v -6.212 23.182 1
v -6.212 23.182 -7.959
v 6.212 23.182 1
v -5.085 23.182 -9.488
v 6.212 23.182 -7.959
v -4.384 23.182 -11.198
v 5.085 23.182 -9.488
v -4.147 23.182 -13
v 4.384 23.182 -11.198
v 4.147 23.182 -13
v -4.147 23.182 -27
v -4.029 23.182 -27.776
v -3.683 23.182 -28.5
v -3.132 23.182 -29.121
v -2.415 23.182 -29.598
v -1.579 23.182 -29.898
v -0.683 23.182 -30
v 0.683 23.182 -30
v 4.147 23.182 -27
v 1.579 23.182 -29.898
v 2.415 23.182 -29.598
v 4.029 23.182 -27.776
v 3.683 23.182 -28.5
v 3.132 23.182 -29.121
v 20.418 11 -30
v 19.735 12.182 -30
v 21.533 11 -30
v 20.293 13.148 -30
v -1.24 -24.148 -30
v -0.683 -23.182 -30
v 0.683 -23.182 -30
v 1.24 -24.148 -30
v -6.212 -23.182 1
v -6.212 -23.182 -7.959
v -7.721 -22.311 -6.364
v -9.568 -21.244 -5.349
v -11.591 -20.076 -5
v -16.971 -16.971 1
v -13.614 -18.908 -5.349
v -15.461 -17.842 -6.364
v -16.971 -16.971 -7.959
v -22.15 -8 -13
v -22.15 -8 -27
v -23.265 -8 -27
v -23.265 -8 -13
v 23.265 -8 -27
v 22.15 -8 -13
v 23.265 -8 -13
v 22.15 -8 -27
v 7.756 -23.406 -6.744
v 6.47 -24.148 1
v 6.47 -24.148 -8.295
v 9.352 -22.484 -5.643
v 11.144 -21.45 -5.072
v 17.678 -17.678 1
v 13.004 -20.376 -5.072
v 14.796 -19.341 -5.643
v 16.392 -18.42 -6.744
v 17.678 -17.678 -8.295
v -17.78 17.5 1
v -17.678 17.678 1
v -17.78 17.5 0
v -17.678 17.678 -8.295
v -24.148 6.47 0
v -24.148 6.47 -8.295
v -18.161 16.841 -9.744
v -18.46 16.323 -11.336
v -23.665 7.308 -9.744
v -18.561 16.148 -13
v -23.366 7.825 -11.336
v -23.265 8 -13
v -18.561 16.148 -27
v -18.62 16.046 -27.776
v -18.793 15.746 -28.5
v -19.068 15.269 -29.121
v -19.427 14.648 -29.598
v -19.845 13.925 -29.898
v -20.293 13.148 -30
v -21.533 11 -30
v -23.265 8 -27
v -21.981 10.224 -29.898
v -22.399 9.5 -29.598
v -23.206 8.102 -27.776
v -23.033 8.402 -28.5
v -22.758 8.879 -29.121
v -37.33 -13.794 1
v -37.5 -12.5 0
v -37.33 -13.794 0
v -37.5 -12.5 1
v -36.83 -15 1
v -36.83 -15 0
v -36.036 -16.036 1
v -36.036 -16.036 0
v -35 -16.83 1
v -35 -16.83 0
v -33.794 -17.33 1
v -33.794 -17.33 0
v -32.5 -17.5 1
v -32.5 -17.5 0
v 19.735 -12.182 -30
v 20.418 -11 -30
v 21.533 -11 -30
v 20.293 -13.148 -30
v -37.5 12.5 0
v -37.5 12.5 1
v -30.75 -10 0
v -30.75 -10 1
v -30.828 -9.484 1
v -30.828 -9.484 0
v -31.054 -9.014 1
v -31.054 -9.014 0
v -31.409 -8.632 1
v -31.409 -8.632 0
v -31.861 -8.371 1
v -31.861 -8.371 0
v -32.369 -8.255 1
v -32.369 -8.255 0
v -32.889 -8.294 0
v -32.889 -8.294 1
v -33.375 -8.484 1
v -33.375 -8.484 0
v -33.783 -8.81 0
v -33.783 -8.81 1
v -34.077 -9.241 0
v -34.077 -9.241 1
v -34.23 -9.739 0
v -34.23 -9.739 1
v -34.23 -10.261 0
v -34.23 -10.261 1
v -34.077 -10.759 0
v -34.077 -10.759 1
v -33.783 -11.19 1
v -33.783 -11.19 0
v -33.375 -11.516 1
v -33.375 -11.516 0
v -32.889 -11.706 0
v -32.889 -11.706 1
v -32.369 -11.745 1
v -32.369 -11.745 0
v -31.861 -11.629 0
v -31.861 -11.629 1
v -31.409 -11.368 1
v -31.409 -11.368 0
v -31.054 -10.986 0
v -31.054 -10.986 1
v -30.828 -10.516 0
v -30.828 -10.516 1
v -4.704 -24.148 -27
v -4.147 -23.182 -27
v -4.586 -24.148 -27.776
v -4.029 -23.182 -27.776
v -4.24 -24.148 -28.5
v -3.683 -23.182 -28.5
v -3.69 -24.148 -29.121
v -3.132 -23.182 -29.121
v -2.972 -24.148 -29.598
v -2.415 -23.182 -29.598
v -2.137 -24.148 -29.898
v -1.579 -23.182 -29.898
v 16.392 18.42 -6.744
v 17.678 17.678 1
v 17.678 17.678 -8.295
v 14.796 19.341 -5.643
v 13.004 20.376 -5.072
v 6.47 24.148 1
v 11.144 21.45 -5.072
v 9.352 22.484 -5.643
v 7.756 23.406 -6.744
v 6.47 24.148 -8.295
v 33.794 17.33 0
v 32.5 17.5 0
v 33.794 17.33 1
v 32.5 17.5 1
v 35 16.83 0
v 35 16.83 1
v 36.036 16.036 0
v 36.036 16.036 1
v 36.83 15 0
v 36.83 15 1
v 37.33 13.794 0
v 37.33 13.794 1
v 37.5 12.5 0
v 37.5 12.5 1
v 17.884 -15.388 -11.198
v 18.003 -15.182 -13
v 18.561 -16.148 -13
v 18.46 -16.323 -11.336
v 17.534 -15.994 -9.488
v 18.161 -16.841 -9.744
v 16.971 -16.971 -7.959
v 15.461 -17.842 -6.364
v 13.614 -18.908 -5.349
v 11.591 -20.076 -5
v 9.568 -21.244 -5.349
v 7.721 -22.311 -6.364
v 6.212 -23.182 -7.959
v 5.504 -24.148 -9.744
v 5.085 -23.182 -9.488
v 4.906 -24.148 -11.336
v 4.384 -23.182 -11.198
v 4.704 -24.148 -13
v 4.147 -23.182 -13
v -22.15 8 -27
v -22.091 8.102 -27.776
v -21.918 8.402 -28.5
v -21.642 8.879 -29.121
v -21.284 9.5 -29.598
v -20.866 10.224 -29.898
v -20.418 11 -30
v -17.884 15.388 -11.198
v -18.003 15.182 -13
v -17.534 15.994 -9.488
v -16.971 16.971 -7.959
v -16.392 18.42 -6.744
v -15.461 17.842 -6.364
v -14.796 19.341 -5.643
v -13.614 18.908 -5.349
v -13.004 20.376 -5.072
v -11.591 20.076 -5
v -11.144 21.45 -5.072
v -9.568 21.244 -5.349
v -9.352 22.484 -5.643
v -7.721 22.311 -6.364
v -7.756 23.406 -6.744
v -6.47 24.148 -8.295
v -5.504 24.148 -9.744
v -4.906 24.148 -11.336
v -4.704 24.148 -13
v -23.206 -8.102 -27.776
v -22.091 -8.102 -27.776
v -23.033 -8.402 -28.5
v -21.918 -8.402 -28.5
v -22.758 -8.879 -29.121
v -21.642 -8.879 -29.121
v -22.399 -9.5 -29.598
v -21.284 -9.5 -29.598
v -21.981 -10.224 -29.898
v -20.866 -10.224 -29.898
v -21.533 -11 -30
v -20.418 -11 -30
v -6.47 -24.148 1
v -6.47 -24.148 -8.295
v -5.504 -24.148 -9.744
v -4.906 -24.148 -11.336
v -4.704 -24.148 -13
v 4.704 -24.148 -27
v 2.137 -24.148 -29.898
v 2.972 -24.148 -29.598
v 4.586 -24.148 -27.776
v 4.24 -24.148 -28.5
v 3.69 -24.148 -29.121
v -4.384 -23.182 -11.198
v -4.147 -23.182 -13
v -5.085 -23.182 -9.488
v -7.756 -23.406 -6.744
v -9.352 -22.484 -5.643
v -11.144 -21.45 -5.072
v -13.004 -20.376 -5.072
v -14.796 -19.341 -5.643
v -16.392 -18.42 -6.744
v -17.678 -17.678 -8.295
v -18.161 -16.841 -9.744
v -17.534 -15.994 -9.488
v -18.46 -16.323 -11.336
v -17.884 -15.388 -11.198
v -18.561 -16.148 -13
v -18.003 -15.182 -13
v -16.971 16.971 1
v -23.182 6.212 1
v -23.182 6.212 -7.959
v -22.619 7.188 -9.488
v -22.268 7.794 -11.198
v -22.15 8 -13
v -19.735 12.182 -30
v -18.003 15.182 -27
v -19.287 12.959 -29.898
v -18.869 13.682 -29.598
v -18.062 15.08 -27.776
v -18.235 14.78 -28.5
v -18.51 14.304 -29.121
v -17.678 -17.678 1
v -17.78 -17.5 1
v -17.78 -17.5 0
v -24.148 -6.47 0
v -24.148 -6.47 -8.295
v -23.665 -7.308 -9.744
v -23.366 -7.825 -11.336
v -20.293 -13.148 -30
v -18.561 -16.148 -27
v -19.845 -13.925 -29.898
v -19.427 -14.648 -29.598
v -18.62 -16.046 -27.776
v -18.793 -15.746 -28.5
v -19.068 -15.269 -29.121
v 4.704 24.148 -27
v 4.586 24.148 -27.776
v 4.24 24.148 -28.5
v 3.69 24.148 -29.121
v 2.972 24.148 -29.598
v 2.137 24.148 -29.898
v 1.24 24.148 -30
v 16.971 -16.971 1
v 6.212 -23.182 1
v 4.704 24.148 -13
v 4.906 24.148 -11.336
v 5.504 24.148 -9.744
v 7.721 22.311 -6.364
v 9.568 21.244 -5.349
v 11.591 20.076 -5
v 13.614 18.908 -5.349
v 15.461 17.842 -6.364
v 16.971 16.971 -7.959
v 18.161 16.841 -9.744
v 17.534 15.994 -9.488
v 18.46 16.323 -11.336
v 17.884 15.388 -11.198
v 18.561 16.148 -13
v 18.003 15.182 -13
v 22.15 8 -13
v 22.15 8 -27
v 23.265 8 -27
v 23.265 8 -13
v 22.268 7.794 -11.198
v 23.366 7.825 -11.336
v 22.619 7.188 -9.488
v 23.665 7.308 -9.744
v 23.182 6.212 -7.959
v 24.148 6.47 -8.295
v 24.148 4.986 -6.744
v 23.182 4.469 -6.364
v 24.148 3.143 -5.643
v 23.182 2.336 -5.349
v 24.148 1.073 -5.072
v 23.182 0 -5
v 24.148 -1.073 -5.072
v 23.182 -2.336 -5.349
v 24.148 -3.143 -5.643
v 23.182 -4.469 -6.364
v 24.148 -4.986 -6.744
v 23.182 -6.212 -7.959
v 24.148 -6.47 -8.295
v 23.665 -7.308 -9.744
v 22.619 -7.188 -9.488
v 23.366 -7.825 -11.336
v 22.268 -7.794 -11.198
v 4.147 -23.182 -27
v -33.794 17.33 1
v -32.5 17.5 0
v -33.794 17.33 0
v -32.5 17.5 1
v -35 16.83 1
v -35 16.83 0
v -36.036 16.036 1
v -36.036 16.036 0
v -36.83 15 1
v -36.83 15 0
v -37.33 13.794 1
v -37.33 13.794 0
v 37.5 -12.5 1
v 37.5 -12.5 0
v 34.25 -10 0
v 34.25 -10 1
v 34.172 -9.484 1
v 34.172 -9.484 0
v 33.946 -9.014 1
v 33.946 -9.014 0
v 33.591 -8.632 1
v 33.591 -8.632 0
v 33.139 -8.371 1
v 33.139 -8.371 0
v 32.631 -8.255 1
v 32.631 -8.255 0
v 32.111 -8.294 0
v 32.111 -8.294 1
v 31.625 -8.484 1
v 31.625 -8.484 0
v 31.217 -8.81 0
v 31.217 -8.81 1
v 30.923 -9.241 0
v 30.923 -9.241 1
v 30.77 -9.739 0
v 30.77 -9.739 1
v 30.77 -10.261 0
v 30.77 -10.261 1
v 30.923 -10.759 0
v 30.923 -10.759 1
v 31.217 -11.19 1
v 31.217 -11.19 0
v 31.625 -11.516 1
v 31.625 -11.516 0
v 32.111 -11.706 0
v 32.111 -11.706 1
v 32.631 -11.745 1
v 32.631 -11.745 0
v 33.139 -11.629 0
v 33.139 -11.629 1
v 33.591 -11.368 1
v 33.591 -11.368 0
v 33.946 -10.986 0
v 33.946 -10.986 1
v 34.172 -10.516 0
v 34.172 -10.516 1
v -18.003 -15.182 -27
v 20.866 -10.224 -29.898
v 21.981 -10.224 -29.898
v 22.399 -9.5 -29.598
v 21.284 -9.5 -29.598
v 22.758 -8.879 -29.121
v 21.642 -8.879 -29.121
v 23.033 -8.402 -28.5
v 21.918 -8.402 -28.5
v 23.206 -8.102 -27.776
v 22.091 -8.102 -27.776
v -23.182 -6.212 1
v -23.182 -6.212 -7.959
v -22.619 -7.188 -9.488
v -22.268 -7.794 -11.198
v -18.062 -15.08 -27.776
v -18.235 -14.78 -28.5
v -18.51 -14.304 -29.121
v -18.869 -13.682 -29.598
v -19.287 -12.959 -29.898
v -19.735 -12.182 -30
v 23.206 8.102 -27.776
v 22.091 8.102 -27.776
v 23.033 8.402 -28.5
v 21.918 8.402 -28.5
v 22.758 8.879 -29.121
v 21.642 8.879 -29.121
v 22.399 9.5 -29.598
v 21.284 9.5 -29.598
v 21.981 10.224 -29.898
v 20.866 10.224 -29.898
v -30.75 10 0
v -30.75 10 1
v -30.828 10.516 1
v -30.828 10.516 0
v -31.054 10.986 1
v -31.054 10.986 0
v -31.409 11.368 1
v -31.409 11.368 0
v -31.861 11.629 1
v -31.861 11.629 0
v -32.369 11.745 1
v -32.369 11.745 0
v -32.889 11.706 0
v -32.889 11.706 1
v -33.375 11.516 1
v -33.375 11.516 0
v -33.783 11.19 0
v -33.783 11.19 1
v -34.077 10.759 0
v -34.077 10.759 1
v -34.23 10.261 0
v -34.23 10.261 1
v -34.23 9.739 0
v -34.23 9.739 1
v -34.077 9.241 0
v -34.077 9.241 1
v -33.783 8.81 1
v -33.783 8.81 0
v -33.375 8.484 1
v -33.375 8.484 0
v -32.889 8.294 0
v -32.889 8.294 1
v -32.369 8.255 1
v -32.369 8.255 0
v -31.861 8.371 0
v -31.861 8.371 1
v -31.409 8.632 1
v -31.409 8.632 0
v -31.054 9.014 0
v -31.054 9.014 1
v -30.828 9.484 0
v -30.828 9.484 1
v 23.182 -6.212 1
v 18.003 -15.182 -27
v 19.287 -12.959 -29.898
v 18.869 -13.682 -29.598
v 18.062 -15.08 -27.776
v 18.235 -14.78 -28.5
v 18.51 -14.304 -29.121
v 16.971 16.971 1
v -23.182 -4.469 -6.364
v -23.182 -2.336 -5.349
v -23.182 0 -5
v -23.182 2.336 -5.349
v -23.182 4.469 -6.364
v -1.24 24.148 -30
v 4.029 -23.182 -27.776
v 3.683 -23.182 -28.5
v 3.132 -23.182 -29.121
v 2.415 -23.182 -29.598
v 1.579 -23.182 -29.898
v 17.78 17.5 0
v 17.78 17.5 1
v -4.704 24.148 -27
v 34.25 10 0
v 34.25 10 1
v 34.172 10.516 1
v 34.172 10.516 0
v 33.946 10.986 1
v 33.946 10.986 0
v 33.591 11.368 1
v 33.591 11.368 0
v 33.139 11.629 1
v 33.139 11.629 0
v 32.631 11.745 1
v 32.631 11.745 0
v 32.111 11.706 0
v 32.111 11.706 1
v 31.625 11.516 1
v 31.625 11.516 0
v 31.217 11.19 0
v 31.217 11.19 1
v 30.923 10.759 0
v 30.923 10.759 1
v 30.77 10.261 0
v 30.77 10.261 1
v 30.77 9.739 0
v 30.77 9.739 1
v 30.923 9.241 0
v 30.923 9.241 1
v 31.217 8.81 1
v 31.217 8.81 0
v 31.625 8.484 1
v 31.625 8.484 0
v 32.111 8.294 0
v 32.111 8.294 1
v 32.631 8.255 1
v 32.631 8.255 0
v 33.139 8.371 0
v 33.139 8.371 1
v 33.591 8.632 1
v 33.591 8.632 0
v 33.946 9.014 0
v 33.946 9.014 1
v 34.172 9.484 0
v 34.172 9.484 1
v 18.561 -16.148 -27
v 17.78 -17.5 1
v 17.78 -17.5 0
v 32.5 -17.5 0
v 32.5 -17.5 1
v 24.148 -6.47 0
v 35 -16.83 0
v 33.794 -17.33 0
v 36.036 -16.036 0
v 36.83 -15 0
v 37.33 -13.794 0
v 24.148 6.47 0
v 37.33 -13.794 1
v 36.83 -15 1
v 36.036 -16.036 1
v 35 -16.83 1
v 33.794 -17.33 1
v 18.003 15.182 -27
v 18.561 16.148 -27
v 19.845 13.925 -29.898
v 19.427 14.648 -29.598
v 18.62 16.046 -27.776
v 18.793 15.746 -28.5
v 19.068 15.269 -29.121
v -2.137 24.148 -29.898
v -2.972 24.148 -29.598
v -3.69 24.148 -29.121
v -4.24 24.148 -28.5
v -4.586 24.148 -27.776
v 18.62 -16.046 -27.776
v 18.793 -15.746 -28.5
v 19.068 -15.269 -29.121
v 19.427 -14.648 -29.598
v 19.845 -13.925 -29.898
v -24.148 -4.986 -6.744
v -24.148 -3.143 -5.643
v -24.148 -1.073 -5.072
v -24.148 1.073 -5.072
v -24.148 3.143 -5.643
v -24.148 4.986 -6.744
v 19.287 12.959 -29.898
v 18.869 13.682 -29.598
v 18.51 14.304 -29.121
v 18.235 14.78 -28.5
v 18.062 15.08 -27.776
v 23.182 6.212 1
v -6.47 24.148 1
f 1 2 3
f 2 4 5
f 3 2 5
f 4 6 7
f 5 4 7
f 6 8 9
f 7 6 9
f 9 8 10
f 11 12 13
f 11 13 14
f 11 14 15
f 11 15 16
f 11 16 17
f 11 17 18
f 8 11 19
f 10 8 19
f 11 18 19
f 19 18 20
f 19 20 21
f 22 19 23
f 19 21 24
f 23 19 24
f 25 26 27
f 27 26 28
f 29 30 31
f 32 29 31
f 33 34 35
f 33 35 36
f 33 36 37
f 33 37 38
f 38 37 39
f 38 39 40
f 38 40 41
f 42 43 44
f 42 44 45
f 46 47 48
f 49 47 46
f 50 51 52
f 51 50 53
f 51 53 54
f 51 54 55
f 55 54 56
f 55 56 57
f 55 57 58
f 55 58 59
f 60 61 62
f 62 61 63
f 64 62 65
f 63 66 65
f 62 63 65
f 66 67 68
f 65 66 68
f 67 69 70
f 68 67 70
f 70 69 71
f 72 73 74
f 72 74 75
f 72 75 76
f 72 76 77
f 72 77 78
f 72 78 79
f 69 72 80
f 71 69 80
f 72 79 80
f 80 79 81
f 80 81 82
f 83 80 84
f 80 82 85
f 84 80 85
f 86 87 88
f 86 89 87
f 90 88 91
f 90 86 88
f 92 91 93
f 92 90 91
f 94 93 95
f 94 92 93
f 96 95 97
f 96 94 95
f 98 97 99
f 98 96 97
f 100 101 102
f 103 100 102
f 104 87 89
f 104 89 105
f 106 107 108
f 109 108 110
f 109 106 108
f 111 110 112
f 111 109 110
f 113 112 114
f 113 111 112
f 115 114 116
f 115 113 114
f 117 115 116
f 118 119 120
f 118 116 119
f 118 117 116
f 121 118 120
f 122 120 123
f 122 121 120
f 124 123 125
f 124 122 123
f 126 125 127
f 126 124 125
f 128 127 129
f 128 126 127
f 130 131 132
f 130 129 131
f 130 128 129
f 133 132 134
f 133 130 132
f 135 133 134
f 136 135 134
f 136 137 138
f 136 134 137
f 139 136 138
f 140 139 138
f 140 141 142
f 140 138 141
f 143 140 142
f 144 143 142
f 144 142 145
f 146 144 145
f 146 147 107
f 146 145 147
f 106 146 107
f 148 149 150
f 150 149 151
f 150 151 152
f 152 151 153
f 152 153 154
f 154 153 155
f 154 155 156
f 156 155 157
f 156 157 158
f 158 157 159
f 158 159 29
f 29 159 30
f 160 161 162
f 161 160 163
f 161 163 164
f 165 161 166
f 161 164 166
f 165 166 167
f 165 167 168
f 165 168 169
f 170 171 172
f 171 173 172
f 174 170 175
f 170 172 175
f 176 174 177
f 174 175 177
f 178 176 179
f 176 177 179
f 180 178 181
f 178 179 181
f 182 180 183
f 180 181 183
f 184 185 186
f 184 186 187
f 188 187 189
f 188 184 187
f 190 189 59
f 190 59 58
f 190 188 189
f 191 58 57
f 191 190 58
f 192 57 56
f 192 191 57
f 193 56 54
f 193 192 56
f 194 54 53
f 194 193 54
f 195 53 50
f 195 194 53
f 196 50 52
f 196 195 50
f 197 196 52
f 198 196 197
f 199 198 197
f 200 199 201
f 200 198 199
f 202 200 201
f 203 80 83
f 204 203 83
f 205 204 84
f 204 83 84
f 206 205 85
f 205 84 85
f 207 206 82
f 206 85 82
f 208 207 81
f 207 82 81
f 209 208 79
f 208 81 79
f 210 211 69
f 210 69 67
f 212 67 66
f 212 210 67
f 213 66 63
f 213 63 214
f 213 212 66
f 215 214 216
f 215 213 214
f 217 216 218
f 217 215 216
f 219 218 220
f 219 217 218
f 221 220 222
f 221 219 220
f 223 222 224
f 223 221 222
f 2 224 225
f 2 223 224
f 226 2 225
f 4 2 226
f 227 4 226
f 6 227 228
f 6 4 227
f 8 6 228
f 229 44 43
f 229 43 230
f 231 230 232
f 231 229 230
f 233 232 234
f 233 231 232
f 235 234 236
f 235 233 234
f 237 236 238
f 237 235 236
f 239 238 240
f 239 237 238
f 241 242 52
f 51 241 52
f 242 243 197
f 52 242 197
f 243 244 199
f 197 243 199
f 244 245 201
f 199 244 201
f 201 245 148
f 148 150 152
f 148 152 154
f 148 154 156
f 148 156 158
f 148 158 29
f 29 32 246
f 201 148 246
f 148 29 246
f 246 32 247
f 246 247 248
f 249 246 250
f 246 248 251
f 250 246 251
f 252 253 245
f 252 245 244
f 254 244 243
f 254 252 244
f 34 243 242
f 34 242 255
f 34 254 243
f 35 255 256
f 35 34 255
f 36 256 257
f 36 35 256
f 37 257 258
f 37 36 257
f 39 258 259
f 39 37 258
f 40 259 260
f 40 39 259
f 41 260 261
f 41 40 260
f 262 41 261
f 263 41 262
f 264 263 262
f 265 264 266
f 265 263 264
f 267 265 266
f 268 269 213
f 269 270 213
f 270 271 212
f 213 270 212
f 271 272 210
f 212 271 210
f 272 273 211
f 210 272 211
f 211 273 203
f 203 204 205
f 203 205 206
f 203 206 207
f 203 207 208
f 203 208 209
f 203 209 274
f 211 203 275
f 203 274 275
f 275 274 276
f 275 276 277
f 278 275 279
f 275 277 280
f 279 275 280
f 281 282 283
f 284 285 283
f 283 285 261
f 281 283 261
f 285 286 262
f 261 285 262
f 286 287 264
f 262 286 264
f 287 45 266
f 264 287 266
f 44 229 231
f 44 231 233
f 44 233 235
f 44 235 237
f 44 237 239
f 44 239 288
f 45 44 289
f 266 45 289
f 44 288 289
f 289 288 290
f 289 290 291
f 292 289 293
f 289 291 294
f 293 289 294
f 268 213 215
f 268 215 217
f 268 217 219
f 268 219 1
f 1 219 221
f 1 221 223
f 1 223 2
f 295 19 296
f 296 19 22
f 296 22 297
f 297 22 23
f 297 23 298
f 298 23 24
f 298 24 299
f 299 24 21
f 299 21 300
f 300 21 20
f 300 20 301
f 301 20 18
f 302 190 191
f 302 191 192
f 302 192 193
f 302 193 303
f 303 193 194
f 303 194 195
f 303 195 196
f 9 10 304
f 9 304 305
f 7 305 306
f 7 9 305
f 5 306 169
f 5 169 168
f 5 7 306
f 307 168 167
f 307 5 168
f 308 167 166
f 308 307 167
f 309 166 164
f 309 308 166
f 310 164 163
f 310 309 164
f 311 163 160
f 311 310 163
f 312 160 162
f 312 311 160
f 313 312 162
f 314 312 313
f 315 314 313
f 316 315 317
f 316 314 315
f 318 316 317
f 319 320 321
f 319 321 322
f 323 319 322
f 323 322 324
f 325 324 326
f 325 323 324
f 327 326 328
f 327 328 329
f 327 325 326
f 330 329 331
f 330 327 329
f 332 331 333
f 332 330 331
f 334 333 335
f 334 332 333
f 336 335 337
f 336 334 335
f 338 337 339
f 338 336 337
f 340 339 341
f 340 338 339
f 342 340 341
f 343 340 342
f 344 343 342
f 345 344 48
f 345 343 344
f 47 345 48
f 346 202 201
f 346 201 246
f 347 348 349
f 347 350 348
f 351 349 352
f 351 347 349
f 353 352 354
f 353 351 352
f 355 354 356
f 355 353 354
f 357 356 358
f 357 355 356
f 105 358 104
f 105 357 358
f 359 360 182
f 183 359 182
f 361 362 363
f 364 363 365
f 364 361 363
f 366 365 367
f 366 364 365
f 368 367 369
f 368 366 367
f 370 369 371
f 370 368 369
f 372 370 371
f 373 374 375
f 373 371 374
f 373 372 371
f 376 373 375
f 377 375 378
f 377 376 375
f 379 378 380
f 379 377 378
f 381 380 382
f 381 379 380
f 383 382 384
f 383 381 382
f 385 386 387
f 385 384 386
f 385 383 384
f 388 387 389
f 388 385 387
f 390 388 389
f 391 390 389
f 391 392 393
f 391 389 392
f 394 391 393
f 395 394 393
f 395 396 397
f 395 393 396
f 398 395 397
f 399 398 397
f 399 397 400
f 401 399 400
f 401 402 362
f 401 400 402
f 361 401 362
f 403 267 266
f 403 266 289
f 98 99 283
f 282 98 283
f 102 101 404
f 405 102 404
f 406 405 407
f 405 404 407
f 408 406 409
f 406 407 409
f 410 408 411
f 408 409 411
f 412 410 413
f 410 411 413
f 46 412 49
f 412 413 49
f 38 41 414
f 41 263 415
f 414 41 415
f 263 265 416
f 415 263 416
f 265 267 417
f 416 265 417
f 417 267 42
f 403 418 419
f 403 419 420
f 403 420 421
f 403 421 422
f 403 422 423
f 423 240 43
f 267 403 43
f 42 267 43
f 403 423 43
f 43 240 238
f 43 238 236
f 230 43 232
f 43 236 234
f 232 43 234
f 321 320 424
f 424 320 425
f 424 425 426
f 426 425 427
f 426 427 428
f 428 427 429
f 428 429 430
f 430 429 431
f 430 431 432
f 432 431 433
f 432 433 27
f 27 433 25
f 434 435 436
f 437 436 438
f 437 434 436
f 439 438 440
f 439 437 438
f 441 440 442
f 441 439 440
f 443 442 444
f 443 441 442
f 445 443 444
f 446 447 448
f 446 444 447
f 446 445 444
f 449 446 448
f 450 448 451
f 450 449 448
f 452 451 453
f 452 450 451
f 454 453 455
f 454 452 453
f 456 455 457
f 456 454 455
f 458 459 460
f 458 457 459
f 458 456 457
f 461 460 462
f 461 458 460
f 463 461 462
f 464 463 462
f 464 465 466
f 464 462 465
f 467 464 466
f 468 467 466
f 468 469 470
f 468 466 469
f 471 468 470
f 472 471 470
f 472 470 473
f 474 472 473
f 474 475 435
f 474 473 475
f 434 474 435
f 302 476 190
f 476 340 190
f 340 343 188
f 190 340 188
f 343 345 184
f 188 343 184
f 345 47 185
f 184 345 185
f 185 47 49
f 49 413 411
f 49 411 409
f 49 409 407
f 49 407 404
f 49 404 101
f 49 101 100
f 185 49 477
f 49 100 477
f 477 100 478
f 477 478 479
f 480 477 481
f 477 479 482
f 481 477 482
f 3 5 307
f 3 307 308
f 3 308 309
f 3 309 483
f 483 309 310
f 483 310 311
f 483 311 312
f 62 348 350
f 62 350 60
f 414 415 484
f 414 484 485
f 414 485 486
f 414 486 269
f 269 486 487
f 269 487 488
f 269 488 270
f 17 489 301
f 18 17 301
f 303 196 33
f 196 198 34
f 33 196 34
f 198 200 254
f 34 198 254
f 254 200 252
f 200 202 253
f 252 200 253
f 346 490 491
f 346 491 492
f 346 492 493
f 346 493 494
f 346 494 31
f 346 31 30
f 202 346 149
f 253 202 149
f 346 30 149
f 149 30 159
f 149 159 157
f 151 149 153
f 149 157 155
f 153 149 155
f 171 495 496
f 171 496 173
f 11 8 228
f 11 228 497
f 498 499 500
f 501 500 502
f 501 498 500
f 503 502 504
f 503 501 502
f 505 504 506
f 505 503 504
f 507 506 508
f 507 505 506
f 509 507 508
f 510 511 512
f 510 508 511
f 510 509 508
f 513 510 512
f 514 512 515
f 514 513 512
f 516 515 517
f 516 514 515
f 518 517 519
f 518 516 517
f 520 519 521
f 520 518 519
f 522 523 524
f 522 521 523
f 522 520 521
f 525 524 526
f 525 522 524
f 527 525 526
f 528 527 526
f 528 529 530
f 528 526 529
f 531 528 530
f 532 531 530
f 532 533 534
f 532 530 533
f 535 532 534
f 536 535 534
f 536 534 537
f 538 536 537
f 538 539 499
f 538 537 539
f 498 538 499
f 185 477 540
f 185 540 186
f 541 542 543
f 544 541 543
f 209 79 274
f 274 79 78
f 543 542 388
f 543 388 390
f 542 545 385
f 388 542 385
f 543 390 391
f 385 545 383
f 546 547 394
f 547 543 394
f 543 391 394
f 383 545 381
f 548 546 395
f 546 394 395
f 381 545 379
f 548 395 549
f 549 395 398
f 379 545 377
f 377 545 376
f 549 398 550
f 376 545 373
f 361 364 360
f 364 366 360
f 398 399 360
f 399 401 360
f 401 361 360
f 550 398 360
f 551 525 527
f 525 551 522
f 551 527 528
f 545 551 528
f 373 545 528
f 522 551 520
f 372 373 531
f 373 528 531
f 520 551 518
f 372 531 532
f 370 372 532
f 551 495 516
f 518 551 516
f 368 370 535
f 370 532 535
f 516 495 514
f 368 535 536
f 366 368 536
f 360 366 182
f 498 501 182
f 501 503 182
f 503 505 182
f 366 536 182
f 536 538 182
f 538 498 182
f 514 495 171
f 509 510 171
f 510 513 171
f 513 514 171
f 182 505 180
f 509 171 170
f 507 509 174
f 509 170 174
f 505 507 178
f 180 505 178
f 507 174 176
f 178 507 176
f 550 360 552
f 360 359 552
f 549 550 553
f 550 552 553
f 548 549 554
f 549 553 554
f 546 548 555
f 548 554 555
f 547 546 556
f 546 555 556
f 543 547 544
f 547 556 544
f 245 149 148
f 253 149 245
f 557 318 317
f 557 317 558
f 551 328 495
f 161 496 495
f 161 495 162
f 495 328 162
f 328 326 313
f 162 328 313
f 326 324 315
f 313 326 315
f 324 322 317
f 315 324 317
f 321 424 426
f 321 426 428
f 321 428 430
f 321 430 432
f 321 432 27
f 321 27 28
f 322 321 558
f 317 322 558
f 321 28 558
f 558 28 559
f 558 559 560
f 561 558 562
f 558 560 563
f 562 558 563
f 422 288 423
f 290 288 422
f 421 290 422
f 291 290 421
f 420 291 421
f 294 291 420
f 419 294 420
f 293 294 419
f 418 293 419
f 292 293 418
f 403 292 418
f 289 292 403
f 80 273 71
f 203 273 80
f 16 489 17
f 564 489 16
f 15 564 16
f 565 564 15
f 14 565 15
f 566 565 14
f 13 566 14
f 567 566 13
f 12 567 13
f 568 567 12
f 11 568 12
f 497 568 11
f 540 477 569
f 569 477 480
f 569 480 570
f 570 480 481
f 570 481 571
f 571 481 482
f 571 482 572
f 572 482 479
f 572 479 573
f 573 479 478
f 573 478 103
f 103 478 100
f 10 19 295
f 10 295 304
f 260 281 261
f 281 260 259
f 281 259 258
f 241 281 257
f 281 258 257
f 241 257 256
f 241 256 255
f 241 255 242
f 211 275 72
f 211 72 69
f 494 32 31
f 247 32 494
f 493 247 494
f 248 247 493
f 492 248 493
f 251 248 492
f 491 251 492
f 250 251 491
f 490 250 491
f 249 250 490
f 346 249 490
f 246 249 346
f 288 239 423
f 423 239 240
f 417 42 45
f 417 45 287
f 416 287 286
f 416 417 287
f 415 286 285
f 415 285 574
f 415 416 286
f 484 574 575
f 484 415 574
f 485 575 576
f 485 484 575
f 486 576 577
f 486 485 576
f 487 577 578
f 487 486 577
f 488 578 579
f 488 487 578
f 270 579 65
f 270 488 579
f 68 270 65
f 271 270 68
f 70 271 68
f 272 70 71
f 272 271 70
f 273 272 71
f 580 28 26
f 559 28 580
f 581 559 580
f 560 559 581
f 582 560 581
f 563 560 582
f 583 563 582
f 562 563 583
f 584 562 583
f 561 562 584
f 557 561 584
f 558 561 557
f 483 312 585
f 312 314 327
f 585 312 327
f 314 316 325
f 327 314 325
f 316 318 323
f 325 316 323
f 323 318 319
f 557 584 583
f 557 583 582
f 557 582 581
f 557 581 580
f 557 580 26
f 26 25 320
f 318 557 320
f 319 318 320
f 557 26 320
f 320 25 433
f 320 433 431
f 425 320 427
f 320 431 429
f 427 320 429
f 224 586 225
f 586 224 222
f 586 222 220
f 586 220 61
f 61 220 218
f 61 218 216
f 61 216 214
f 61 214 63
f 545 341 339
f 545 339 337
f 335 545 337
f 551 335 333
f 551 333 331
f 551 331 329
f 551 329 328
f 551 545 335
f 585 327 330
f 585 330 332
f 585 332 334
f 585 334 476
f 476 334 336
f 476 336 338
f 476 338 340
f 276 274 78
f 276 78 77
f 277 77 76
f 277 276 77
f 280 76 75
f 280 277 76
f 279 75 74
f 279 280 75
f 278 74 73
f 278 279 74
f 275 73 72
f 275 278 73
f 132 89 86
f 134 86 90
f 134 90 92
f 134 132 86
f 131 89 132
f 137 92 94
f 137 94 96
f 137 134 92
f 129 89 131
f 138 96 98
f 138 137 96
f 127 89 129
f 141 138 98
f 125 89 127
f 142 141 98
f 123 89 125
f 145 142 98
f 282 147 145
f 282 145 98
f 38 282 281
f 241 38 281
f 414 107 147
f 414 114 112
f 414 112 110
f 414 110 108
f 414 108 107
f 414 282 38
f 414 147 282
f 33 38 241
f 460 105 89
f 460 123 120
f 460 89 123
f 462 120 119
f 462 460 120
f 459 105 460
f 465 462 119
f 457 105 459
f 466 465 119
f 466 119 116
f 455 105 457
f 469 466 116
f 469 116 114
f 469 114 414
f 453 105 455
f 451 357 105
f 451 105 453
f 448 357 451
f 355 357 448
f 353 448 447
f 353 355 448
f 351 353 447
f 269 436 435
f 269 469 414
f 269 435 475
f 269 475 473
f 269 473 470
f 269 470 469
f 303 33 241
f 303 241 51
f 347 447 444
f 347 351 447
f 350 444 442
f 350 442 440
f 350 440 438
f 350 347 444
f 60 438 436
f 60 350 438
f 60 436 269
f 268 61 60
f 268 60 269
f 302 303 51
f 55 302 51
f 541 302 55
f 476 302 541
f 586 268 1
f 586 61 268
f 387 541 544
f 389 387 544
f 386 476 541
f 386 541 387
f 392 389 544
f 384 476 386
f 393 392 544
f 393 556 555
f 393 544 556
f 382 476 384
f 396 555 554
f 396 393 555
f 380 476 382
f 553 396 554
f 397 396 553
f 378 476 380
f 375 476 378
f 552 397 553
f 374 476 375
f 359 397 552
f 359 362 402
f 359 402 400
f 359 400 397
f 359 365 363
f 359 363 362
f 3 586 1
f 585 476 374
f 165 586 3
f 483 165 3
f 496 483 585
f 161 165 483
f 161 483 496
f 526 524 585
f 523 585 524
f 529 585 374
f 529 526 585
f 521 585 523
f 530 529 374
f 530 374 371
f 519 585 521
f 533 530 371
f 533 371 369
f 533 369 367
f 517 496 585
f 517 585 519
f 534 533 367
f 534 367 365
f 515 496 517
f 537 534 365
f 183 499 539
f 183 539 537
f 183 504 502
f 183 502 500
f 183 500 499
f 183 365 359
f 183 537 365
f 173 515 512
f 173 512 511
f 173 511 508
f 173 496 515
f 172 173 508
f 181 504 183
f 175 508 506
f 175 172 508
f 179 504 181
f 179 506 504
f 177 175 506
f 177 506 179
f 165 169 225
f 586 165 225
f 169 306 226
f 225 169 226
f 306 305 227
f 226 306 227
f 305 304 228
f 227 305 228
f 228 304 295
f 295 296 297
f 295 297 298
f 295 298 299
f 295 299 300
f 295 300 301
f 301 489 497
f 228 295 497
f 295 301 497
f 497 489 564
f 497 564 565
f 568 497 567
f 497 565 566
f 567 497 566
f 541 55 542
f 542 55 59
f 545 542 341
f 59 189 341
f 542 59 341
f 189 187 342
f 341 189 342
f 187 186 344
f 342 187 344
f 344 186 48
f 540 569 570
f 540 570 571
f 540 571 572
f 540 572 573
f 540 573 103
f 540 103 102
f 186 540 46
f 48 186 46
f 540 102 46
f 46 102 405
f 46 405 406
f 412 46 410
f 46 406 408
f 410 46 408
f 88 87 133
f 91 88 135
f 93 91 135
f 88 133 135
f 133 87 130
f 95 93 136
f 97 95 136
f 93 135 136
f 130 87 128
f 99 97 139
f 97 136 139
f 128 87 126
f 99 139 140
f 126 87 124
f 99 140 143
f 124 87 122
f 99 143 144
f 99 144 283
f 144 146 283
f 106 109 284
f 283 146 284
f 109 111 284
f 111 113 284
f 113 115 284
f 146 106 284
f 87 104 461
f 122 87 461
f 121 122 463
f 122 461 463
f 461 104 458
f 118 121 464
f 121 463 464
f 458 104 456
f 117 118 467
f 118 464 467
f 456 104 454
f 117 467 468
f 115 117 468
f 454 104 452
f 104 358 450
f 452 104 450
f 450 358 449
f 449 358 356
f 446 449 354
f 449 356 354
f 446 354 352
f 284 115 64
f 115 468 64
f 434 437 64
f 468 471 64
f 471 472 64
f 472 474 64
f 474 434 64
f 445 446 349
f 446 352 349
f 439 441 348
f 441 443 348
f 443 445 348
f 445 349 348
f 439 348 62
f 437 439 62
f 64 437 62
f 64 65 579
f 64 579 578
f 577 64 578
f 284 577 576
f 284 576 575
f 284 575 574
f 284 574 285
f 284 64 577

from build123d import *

# Parameters (mm, degrees)
F0_W             = 75
F0_H             = 35
F1_DEPTH         = 1
F3_DEPTH         = 30
F5_DEPTH         = 35
F6_R             = 5
F7_R             = 1.75
F8_DEPTH         = 25
F9_DEPTH         = 1
F10_DEPTH        = 65.4
F13_DEPTH        = 35.6
F13_COPIES_COUNT = 6
F14_T1_DEPTH     = 16.1153550717
F14_T3_DEPTH     = 16.1153550717
F14_T5_DEPTH     = 16.1153550717
F14_T7_DEPTH     = 16.1153550717
F14_T9_DEPTH     = 16.1153550717
F14_T11_DEPTH    = 16.1153550717
F14_T13_DEPTH    = 16.1153550717
F14_T15_DEPTH    = 16.1153550717
F14_T17_DEPTH    = 16.1153550717
F14_T19_DEPTH    = 16.1153550717


# Not quite as in the source:
# - a fillet or chamfer that OpenCascade refuses, or shapes differently, is made with other operations: its cross-section is extruded or revolved along the edge and cut away or added
# - a pattern or mirror of a feature is missing from the dataset's text; its kind, count and spacing are read off the source's solid


with BuildPart() as f1:
    # F0 (on Top) → F1 (new body)
    with BuildSketch(Plane.XY):
        Rectangle(F0_W, F0_H)
    extrude(amount=F1_DEPTH)

    # F2 (on Top) → F3 (join)
    with BuildSketch(Plane.XY):
        Polygon((24.1481456572, 6.4704761276), (17.6776695297, 17.6776695297), (6.4704761276, 24.1481456572), (-6.4704761276, 24.1481456572), (-17.6776695297, 17.6776695297), (-24.1481456572, 6.4704761276), (-24.1481456572, -6.4704761276), (-17.6776695297, -17.6776695297), (-6.4704761276, -24.1481456572), (6.4704761276, -24.1481456572), (17.6776695297, -17.6776695297), (24.1481456572, -6.4704761276), align=None)
    extrude(amount=-F3_DEPTH)

    # F4 (on face) → F5 (cut)
    with BuildSketch(Plane(origin=(0, 0, -30), x_dir=(1, 0, 0), z_dir=(0, 0, -1))):
        Polygon((6.2116570825, -23.1822198309), (16.9705627485, -16.9705627485), (23.1822198309, -6.2116570825), (23.1822198309, 6.2116570825), (16.9705627485, 16.9705627485), (6.2116570825, 23.1822198309), (-6.2116570825, 23.1822198309), (-16.9705627485, 16.9705627485), (-23.1822198309, 6.2116570825), (-23.1822198309, -6.2116570825), (-16.9705627485, -16.9705627485), (-6.2116570825, -23.1822198309), align=None)
    extrude(amount=-F5_DEPTH, mode=Mode.SUBTRACT)

    # F6
    f6_edges = [f1.edges().sort_by_distance(p)[0] for p in [
        (37.5, -17.5, 0.5),
        (37.5, 17.5, 0.5),
        (-37.5, -17.5, 0.5),
        (-37.5, 17.5, 0.5),
    ]]
    fillet(f6_edges, radius=F6_R)

    # F7 (on Top) → F8 (cut)
    with BuildSketch(Plane.XY):
        with Locations((-32.5, 10)):
            Circle(F7_R)
        with Locations((-32.5, -10)):
            Circle(F7_R)
        with Locations((32.5, -10)):
            Circle(F7_R)
        with Locations((32.5, 10)):
            Circle(F7_R)
    extrude(amount=F8_DEPTH, mode=Mode.SUBTRACT)

    # F2 (on Top) → F9 (join)
    with BuildSketch(Plane.XY):
        Polygon((24.1481456572, 6.4704761276), (17.6776695297, 17.6776695297), (6.4704761276, 24.1481456572), (-6.4704761276, 24.1481456572), (-17.6776695297, 17.6776695297), (-24.1481456572, 6.4704761276), (-24.1481456572, -6.4704761276), (-17.6776695297, -17.6776695297), (-6.4704761276, -24.1481456572), (6.4704761276, -24.1481456572), (17.6776695297, -17.6776695297), (24.1481456572, -6.4704761276), align=None)
    extrude(amount=F9_DEPTH)

    # F4 (on face) → F10 (cut)
    with BuildSketch(Plane(origin=(0, 0, -30), x_dir=(1, 0, 0), z_dir=(0, 0, -1))):
        Polygon((6.2116570825, -23.1822198309), (16.9705627485, -16.9705627485), (23.1822198309, -6.2116570825), (23.1822198309, 6.2116570825), (16.9705627485, 16.9705627485), (6.2116570825, 23.1822198309), (-6.2116570825, 23.1822198309), (-16.9705627485, 16.9705627485), (-23.1822198309, 6.2116570825), (-23.1822198309, -6.2116570825), (-16.9705627485, -16.9705627485), (-6.2116570825, -23.1822198309), align=None)
    extrude(amount=-F10_DEPTH, mode=Mode.SUBTRACT)

    # F12 (on Right) → F13 (cut)
    with BuildSketch(Plane.YZ):
        with BuildLine():
            ThreePointArc((-8, -13), (0, -21), (8, -13))
            ThreePointArc((8, -13), (0, -5), (-8, -13))
        make_face()
        with BuildLine():
            Line((8, -37.0977148414), (8, -13))
            ThreePointArc((8, -13), (0, -21), (-8, -13))
            Line((-8, -13), (-8, -36.2910553813))
            Line((-8, -36.2910553813), (8, -37.0977148414))
        make_face()
    f13 = extrude(amount=F13_DEPTH, mode=Mode.SUBTRACT)

    # F13_copies: F13 ×6 about axis
    f13_copies_axis = Axis((0, 0, 0), (0, 0, 1))
    for i in range(1, F13_COPIES_COUNT):
        add(f13.rotate(f13_copies_axis, i * 360 / F13_COPIES_COUNT), mode=Mode.SUBTRACT)

    # F14: fillet of radius 3 on 12 edges, made by hand

    # F14_s2 → F14_t1 (cut)
    with BuildSketch(Plane.YZ.offset(14.6497195661)):
        with BuildLine():
            ThreePointArc((-11, -30), (-8.8786796564, -29.1213203436), (-8, -27))
            Line((-8, -27), (-8, -30))
            Line((-8, -30), (-11, -30))
        make_face()
        with BuildLine():
            ThreePointArc((8, -27), (8.8786796564, -29.1213203436), (11, -30))
            Line((11, -30), (8, -30))
            Line((8, -30), (8, -27))
        make_face()
    extrude(amount=F14_T1_DEPTH, mode=Mode.SUBTRACT)

    # F14_s4 → F14_t3 (cut)
    with BuildSketch(Plane.YZ.offset(-30.7650746377)):
        with BuildLine():
            ThreePointArc((-8, -27), (-8.8786796564, -29.1213203436), (-11, -30))
            Line((-11, -30), (-8, -30))
            Line((-8, -30), (-8, -27))
        make_face()
        with BuildLine():
            ThreePointArc((8, -27), (8.8786796564, -29.1213203436), (11, -30))
            Line((11, -30), (8, -30))
            Line((8, -30), (8, -27))
        make_face()
    extrude(amount=F14_T3_DEPTH, mode=Mode.SUBTRACT)

    # F14_s6 → F14_t5 (cut)
    with BuildSketch(Plane(origin=(-15.3825373189, -26.6433361856, 0), x_dir=(0, 0, 1), z_dir=(0.5, 0.8660254038, 0))):
        with BuildLine():
            ThreePointArc((-30, -11), (-29.1213203436, -8.8786796564), (-27, -8))
            Line((-27, -8), (-30, -8))
            Line((-30, -8), (-30, -11))
        make_face()
    extrude(amount=F14_T5_DEPTH, mode=Mode.SUBTRACT)

    # F14_s8 → F14_t7 (cut)
    with BuildSketch(Plane(origin=(-7.324859783, 12.6870293026, 0), x_dir=(0, 0, 1), z_dir=(-0.5, 0.8660254038, 0))):
        with BuildLine():
            ThreePointArc((-30, -11), (-29.1213203436, -8.8786796564), (-27, -8))
            Line((-27, -8), (-30, -8))
            Line((-30, -8), (-30, -11))
        make_face()
    extrude(amount=F14_T7_DEPTH, mode=Mode.SUBTRACT)

    # F14_s10 → F14_t9 (cut)
    with BuildSketch(Plane(origin=(-7.324859783, -12.6870293026, 0), x_dir=(0, 0, 1), z_dir=(-0.5, -0.8660254038, 0))):
        with BuildLine():
            ThreePointArc((-27, -8), (-29.1213203436, -8.8786796564), (-30, -11))
            Line((-30, -11), (-30, -8))
            Line((-30, -8), (-27, -8))
        make_face()
    extrude(amount=F14_T9_DEPTH, mode=Mode.SUBTRACT)

    # F14_s12 → F14_t11 (cut)
    with BuildSketch(Plane(origin=(7.324859783, 12.6870293026, 0), x_dir=(0, 0, 1), z_dir=(0.5, 0.8660254038, 0))):
        with BuildLine():
            ThreePointArc((-27, -8), (-29.1213203436, -8.8786796564), (-30, -11))
            Line((-30, -11), (-30, -8))
            Line((-30, -8), (-27, -8))
        make_face()
    extrude(amount=F14_T11_DEPTH, mode=Mode.SUBTRACT)

    # F14_s14 → F14_t13 (cut)
    with BuildSketch(Plane(origin=(-15.3825373189, 26.6433361856, 0), x_dir=(0, 0, 1), z_dir=(0.5, -0.8660254038, 0))):
        with BuildLine():
            ThreePointArc((-30, -11), (-29.1213203436, -8.8786796564), (-27, -8))
            Line((-27, -8), (-30, -8))
            Line((-30, -8), (-30, -11))
        make_face()
    extrude(amount=F14_T13_DEPTH, mode=Mode.SUBTRACT)

    # F14_s16 → F14_t15 (cut)
    with BuildSketch(Plane(origin=(15.3825373189, -26.6433361856, 0), x_dir=(0, 0, 1), z_dir=(-0.5, 0.8660254038, 0))):
        with BuildLine():
            ThreePointArc((-30, -11), (-29.1213203436, -8.8786796564), (-27, -8))
            Line((-27, -8), (-30, -8))
            Line((-30, -8), (-30, -11))
        make_face()
    extrude(amount=F14_T15_DEPTH, mode=Mode.SUBTRACT)

    # F14_s18 → F14_t17 (cut)
    with BuildSketch(Plane(origin=(15.3825373189, 26.6433361856, 0), x_dir=(0, 0, 1), z_dir=(-0.5, -0.8660254038, 0))):
        with BuildLine():
            ThreePointArc((-30, -11), (-29.1213203436, -8.8786796564), (-27, -8))
            Line((-27, -8), (-30, -8))
            Line((-30, -8), (-30, -11))
        make_face()
    extrude(amount=F14_T17_DEPTH, mode=Mode.SUBTRACT)

    # F14_s20 → F14_t19 (cut)
    with BuildSketch(Plane(origin=(7.324859783, -12.6870293026, 0), x_dir=(0, 0, 1), z_dir=(0.5, -0.8660254038, 0))):
        with BuildLine():
            ThreePointArc((-27, -8), (-29.1213203436, -8.8786796564), (-30, -11))
            Line((-30, -11), (-30, -8))
            Line((-30, -8), (-27, -8))
        make_face()
    extrude(amount=F14_T19_DEPTH, mode=Mode.SUBTRACT)


solid = f1.part
